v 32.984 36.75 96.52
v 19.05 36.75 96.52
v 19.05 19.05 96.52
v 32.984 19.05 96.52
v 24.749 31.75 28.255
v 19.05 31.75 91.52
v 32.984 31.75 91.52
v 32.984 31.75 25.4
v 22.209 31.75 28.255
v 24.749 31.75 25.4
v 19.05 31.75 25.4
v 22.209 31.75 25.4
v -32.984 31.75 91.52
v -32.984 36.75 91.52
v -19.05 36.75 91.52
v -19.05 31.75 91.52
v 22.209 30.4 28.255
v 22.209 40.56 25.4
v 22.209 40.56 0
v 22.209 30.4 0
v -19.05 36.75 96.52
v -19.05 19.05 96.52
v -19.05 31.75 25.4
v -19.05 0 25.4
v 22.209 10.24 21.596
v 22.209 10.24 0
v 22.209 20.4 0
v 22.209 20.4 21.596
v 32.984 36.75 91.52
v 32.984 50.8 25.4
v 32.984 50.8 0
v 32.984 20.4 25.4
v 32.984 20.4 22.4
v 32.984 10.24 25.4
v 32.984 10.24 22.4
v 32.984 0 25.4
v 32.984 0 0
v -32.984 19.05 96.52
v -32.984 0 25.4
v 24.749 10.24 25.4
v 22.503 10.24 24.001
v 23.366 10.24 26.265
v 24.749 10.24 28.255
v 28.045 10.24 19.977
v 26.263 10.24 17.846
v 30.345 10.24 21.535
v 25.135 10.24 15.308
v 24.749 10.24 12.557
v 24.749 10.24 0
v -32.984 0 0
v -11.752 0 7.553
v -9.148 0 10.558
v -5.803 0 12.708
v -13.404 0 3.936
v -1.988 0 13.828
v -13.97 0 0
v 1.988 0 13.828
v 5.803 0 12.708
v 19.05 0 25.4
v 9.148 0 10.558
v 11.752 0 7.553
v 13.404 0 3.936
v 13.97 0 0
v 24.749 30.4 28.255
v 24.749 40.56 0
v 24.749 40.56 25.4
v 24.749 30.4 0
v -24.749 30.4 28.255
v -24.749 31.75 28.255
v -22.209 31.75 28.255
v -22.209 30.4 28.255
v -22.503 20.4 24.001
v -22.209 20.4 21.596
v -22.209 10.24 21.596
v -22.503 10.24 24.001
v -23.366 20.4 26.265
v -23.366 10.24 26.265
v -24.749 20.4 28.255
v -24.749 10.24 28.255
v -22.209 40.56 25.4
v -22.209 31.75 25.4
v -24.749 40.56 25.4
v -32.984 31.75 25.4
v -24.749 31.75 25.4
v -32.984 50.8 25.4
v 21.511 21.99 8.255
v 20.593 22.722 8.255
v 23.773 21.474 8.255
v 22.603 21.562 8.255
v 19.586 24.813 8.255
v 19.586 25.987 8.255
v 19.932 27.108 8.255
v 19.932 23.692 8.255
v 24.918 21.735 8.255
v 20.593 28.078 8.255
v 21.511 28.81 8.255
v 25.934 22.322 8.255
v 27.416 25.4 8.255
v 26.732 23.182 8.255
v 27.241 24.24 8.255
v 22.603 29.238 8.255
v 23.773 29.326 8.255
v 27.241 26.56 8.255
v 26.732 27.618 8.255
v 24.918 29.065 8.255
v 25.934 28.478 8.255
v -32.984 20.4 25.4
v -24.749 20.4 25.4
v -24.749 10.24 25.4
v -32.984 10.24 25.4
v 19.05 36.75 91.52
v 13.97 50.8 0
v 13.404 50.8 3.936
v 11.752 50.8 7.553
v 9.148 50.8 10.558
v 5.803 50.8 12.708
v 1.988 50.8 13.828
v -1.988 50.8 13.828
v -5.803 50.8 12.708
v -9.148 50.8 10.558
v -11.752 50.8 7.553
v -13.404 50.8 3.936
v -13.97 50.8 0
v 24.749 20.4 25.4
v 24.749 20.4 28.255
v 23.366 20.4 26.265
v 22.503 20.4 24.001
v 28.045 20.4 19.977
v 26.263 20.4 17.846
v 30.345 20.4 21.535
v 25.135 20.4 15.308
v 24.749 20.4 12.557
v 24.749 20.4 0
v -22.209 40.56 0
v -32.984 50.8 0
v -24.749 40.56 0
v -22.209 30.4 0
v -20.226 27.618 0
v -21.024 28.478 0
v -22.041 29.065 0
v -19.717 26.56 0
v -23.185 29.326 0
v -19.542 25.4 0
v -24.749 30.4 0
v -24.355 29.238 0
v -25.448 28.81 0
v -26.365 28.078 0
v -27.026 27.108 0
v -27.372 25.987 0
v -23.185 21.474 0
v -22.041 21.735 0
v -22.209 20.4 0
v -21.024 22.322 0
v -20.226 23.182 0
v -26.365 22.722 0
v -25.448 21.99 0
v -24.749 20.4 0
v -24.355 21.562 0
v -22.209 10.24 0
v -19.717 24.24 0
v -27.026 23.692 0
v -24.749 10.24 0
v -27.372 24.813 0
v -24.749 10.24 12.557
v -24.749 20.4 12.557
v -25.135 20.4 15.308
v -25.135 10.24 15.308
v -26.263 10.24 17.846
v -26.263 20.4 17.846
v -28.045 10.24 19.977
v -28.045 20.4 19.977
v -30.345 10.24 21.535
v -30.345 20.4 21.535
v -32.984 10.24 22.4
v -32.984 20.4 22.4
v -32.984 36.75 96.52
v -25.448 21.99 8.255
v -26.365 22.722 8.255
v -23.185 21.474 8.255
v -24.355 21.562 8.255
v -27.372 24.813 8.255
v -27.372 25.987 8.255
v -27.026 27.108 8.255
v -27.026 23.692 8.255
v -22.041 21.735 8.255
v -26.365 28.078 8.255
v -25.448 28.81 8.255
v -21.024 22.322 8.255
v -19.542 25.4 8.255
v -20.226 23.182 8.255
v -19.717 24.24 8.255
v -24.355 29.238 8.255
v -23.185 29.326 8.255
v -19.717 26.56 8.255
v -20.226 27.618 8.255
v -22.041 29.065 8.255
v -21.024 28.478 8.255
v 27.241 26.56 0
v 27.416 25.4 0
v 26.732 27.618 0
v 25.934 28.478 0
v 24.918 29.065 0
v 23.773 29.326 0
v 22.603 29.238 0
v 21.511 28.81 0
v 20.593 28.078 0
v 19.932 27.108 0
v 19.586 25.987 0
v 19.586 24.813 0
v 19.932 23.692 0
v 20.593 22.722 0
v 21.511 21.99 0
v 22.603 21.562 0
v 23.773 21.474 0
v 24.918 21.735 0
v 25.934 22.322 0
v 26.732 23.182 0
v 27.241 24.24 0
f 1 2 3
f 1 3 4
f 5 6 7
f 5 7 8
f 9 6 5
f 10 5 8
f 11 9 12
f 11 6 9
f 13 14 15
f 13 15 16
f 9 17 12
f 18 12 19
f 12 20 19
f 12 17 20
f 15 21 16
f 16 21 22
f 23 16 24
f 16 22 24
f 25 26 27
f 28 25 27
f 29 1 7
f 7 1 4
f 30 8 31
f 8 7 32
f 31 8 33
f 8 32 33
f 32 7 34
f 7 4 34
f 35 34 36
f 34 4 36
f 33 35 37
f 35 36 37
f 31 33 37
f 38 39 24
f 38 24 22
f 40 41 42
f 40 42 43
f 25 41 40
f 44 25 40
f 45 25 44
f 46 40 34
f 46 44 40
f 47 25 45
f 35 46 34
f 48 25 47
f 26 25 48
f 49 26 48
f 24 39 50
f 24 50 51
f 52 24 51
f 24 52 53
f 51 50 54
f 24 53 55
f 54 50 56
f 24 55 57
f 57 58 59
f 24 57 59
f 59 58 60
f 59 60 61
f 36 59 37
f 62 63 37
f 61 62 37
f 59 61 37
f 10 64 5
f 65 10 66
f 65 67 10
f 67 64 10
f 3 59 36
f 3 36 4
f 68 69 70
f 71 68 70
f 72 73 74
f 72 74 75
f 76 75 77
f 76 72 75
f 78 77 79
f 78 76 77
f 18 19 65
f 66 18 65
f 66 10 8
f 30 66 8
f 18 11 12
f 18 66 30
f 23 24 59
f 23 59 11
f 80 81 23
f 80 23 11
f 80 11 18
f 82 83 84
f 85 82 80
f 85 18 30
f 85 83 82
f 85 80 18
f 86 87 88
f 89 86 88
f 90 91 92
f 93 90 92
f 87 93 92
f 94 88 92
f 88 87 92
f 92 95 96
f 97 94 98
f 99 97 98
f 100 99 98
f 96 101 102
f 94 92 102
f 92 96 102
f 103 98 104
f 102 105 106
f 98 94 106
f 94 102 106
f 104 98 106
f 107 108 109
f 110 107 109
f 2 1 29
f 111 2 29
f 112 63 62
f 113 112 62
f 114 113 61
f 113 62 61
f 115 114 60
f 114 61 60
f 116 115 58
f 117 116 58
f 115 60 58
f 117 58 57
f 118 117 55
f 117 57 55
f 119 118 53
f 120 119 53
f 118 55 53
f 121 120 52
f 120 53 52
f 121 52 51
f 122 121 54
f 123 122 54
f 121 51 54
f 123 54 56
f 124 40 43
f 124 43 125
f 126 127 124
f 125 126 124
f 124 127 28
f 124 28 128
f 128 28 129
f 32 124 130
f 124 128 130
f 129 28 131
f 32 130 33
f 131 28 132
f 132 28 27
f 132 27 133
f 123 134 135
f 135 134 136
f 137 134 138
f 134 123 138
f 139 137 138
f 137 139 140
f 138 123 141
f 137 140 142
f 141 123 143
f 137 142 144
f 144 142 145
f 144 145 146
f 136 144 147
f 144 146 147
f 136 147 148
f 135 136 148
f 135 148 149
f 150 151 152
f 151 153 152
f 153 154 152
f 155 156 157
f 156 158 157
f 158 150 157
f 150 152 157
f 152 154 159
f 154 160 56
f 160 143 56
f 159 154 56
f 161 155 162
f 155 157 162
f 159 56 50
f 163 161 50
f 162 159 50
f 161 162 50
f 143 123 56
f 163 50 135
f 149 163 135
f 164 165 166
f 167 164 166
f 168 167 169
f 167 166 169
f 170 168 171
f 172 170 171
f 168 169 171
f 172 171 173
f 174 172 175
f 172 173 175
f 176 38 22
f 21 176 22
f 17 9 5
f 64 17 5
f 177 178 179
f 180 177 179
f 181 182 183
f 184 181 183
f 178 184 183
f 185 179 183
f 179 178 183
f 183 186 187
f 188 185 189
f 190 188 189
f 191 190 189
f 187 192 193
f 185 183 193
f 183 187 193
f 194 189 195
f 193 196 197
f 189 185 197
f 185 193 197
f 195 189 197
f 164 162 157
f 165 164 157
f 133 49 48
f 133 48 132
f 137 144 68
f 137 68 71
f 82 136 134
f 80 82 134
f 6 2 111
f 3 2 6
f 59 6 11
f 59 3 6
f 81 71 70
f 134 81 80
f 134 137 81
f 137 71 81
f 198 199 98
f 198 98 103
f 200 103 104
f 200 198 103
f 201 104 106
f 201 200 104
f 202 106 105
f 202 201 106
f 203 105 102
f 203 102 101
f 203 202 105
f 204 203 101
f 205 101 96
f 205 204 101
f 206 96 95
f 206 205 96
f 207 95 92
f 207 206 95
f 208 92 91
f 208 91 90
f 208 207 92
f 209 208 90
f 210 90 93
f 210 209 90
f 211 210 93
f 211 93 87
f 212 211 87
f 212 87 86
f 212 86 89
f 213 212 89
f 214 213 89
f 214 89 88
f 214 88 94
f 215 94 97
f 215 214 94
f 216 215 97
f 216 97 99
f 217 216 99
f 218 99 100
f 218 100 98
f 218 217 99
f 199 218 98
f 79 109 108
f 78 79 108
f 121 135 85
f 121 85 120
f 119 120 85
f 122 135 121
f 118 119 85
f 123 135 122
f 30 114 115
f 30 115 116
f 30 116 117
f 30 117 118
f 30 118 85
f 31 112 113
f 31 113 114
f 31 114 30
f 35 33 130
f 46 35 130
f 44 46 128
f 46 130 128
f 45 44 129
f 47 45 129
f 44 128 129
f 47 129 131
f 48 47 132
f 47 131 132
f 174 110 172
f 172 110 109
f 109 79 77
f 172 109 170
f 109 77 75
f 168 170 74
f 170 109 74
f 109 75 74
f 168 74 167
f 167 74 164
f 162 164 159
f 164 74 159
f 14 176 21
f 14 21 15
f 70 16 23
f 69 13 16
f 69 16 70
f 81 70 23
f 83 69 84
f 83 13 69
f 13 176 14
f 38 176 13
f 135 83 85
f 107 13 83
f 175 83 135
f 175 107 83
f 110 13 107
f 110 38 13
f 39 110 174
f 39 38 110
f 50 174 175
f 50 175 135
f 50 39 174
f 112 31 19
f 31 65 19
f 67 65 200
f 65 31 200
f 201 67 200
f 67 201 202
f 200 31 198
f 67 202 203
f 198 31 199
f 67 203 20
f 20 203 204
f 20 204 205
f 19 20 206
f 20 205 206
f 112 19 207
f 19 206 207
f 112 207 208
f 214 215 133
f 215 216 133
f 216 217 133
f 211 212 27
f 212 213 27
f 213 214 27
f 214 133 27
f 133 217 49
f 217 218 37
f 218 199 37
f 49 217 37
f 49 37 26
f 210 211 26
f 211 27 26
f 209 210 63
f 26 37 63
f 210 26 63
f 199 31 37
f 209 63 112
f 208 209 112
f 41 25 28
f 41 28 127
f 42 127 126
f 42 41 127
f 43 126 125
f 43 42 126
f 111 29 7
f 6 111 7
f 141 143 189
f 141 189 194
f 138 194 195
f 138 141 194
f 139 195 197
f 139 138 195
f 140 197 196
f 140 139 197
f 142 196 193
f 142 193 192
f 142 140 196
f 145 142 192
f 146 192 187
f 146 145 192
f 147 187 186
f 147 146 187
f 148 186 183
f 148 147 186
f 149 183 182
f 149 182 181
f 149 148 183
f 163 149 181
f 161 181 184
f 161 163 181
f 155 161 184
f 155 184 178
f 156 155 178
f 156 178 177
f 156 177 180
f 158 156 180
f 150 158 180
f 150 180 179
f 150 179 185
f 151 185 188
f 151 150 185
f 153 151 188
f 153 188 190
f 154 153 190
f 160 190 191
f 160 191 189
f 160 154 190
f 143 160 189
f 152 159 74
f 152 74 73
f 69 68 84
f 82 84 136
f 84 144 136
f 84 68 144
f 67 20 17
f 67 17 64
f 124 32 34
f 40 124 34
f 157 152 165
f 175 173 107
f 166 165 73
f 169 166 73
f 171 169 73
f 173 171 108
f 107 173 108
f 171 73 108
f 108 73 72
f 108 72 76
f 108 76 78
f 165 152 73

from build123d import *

# Parameters (mm, degrees)
BOSS_EXTRUDE1_DEPTH = 50.8
SKETCH1_4_W         = 13.934163053
SKETCH1_4_H         = 71.12
BOSS_EXTRUDE2_DEPTH = 50.8
CUT_EXTRUDE1_START  = -32.984163053
CUT_EXTRUDE1_DEPTH  = 65.968326106
SKETCH3_R           = 3.937
SKETCH3_W           = 2.54
SKETCH3_H           = 10.16
CUT_EXTRUDE2_DEPTH  = 8.255
SKETCH3_2_W         = 2.54
SKETCH3_2_H         = 10.16
CUT_EXTRUDE3_DEPTH  = 28.255
CUT_EXTRUDE4_START  = 32.984163
CUT_EXTRUDE4_DEPTH  = 10.775
CUT_EXTRUDE5_START  = -22.209163
CUT_EXTRUDE5_DEPTH  = 10.775
FILLET1_R           = 10


# Read off the part's stored shape, not the designer's step: Cut-Extrude1
with BuildPart() as part:
    # Sketch1 → Boss-Extrude1 (new body)
    with BuildSketch(Plane(origin=(0, 0, 0), x_dir=(1, 0, 0), z_dir=(0, 1, 0))):
        with BuildLine():
            ThreePointArc((13.97, 0), (0, -13.97), (-13.97, 0))
            Line((-13.97, 0), (-32.984163053, 0))
            Line((-32.984163053, 0), (-32.984163053, -25.4))
            Line((-32.984163053, -25.4), (-19.05, -25.4))
            Line((-19.05, -25.4), (19.05, -25.4))
            Line((19.05, -25.4), (32.984163053, -25.4))
            Line((32.984163053, -25.4), (32.984163053, 0))
            Line((32.984163053, 0), (13.97, 0))
        make_face()
    extrude(amount=BOSS_EXTRUDE1_DEPTH)

    # Sketch1<4> → Boss-Extrude2 (add)
    with BuildSketch(Plane(origin=(0, 0, 0), x_dir=(1, 0, 0), z_dir=(0, 1, 0))):
        with Locations((-26.017081527, -60.96)):
            Rectangle(SKETCH1_4_W, SKETCH1_4_H)
        with Locations((26.017081527, -60.96)):
            Rectangle(SKETCH1_4_W, SKETCH1_4_H)
    extrude(amount=BOSS_EXTRUDE2_DEPTH)

    # Cut-Extrude1 outline → Cut-Extrude1 (cut)
    with BuildSketch(Plane(origin=(0, 0, 0), x_dir=(0, 0, -1), z_dir=(1, 0, 0)).offset(CUT_EXTRUDE1_START)):
        Polygon((-96.52, 0), (-25.4, 0), (-96.52, 19.05), align=None)
        Polygon((-91.52, 31.75), (-25.4, 31.75), (-25.4, 50.8), (-96.52, 50.8), (-96.52, 36.75), (-91.52, 36.75), align=None)
    extrude(amount=CUT_EXTRUDE1_DEPTH, mode=Mode.SUBTRACT)

    # Sketch3 → Cut-Extrude2 (cut)
    with BuildSketch(Plane.XY):
        with Locations((23.479163053, 25.4)):
            Circle(SKETCH3_R)
        with Locations((-23.479163053, 25.4)):
            Circle(SKETCH3_R)
        with Locations((23.479163053, 35.48)):
            Rectangle(SKETCH3_W, SKETCH3_H)
        with Locations((-23.479163053, 35.48)):
            Rectangle(SKETCH3_W, SKETCH3_H)
        with Locations((-23.479163053, 15.32)):
            Rectangle(SKETCH3_W, SKETCH3_H)
        with Locations((23.479163053, 15.32)):
            Rectangle(SKETCH3_W, SKETCH3_H)
    extrude(amount=CUT_EXTRUDE2_DEPTH, mode=Mode.SUBTRACT)

    # Sketch3<2> → Cut-Extrude3 (cut)
    with BuildSketch(Plane.XY):
        with Locations((23.479163053, 35.48)):
            Rectangle(SKETCH3_2_W, SKETCH3_2_H)
        with Locations((-23.479163053, 35.48)):
            Rectangle(SKETCH3_2_W, SKETCH3_2_H)
        with Locations((23.479163053, 15.32)):
            Rectangle(SKETCH3_2_W, SKETCH3_2_H)
        with Locations((-23.479163053, 15.32)):
            Rectangle(SKETCH3_2_W, SKETCH3_2_H)
    extrude(amount=CUT_EXTRUDE3_DEPTH, mode=Mode.SUBTRACT)

    # Sketch2<4> → Cut-Extrude4 (cut)
    with BuildSketch(Plane(origin=(0, 0, 0), x_dir=(0, 0, -1), z_dir=(1, 0, 0)).offset(CUT_EXTRUDE4_START)):
        Polygon((-22.4, 20.4), (-25.4, 20.4), (-25.4, 19.05), (-25.4, 10.24), (-22.4, 10.24), align=None)
    extrude(amount=-CUT_EXTRUDE4_DEPTH, mode=Mode.SUBTRACT)

    # Sketch2<5> → Cut-Extrude5 (cut)
    with BuildSketch(Plane(origin=(0, 0, 0), x_dir=(0, 0, -1), z_dir=(1, 0, 0)).offset(CUT_EXTRUDE5_START)):
        Polygon((-22.4, 20.4), (-25.4, 20.4), (-25.4, 19.05), (-25.4, 10.24), (-22.4, 10.24), align=None)
    extrude(amount=-CUT_EXTRUDE5_DEPTH, mode=Mode.SUBTRACT)

    # Fillet1
    # the kernel refuses this fillet: 10 mm, written as the material it adds along each edge
    with BuildSketch(Plane(origin=(22.209163053, 10.24, 28.255), x_dir=(0, 0, -1), z_dir=(0, 1, 0)), Plane(origin=(-22.209163053, 20.4, 28.255), x_dir=(0, 0, -1), z_dir=(0, -1, 0))) as fillet1_piece_1:
        with BuildLine():
            CenterArc((6.659459438, -10), FILLET1_R, 90, 41.754936598)
            Line((0, -2.54), (0, 0))
            Line((0, 0), (6.659459438, 0))
        make_face()
    extrude(amount=10.16)
    # the kernel refuses this fillet: 10 mm, written as the material it takes off along each edge
    with BuildSketch(Plane(origin=(-24.749163053, 20.4, 22.4), x_dir=(0, 0, -1), z_dir=(0, -1, 0))) as fillet1_2_piece_1:
        with BuildLine():
            CenterArc((9.843006391, -10), FILLET1_R, 90, 79.834039024)
            Line((0, -8.234999947), (0, 0))
            Line((0, 0), (9.843006391, 0))
        make_face()
    extrude(amount=10.16, mode=Mode.SUBTRACT)
    with BuildSketch(Plane(origin=(24.749163053, 20.4, 22.4), x_dir=(0, 0, -1), z_dir=(0, -1, 0))) as fillet1_2_piece_2:
        with BuildLine():
            CenterArc((9.843006391, 10), FILLET1_R, 190.165960976, 79.834039024)
            Line((0, 8.234999947), (0, 0))
            Line((0, 0), (9.843006391, 0))
        make_face()
    extrude(amount=10.16, mode=Mode.SUBTRACT)


solid = part.part
